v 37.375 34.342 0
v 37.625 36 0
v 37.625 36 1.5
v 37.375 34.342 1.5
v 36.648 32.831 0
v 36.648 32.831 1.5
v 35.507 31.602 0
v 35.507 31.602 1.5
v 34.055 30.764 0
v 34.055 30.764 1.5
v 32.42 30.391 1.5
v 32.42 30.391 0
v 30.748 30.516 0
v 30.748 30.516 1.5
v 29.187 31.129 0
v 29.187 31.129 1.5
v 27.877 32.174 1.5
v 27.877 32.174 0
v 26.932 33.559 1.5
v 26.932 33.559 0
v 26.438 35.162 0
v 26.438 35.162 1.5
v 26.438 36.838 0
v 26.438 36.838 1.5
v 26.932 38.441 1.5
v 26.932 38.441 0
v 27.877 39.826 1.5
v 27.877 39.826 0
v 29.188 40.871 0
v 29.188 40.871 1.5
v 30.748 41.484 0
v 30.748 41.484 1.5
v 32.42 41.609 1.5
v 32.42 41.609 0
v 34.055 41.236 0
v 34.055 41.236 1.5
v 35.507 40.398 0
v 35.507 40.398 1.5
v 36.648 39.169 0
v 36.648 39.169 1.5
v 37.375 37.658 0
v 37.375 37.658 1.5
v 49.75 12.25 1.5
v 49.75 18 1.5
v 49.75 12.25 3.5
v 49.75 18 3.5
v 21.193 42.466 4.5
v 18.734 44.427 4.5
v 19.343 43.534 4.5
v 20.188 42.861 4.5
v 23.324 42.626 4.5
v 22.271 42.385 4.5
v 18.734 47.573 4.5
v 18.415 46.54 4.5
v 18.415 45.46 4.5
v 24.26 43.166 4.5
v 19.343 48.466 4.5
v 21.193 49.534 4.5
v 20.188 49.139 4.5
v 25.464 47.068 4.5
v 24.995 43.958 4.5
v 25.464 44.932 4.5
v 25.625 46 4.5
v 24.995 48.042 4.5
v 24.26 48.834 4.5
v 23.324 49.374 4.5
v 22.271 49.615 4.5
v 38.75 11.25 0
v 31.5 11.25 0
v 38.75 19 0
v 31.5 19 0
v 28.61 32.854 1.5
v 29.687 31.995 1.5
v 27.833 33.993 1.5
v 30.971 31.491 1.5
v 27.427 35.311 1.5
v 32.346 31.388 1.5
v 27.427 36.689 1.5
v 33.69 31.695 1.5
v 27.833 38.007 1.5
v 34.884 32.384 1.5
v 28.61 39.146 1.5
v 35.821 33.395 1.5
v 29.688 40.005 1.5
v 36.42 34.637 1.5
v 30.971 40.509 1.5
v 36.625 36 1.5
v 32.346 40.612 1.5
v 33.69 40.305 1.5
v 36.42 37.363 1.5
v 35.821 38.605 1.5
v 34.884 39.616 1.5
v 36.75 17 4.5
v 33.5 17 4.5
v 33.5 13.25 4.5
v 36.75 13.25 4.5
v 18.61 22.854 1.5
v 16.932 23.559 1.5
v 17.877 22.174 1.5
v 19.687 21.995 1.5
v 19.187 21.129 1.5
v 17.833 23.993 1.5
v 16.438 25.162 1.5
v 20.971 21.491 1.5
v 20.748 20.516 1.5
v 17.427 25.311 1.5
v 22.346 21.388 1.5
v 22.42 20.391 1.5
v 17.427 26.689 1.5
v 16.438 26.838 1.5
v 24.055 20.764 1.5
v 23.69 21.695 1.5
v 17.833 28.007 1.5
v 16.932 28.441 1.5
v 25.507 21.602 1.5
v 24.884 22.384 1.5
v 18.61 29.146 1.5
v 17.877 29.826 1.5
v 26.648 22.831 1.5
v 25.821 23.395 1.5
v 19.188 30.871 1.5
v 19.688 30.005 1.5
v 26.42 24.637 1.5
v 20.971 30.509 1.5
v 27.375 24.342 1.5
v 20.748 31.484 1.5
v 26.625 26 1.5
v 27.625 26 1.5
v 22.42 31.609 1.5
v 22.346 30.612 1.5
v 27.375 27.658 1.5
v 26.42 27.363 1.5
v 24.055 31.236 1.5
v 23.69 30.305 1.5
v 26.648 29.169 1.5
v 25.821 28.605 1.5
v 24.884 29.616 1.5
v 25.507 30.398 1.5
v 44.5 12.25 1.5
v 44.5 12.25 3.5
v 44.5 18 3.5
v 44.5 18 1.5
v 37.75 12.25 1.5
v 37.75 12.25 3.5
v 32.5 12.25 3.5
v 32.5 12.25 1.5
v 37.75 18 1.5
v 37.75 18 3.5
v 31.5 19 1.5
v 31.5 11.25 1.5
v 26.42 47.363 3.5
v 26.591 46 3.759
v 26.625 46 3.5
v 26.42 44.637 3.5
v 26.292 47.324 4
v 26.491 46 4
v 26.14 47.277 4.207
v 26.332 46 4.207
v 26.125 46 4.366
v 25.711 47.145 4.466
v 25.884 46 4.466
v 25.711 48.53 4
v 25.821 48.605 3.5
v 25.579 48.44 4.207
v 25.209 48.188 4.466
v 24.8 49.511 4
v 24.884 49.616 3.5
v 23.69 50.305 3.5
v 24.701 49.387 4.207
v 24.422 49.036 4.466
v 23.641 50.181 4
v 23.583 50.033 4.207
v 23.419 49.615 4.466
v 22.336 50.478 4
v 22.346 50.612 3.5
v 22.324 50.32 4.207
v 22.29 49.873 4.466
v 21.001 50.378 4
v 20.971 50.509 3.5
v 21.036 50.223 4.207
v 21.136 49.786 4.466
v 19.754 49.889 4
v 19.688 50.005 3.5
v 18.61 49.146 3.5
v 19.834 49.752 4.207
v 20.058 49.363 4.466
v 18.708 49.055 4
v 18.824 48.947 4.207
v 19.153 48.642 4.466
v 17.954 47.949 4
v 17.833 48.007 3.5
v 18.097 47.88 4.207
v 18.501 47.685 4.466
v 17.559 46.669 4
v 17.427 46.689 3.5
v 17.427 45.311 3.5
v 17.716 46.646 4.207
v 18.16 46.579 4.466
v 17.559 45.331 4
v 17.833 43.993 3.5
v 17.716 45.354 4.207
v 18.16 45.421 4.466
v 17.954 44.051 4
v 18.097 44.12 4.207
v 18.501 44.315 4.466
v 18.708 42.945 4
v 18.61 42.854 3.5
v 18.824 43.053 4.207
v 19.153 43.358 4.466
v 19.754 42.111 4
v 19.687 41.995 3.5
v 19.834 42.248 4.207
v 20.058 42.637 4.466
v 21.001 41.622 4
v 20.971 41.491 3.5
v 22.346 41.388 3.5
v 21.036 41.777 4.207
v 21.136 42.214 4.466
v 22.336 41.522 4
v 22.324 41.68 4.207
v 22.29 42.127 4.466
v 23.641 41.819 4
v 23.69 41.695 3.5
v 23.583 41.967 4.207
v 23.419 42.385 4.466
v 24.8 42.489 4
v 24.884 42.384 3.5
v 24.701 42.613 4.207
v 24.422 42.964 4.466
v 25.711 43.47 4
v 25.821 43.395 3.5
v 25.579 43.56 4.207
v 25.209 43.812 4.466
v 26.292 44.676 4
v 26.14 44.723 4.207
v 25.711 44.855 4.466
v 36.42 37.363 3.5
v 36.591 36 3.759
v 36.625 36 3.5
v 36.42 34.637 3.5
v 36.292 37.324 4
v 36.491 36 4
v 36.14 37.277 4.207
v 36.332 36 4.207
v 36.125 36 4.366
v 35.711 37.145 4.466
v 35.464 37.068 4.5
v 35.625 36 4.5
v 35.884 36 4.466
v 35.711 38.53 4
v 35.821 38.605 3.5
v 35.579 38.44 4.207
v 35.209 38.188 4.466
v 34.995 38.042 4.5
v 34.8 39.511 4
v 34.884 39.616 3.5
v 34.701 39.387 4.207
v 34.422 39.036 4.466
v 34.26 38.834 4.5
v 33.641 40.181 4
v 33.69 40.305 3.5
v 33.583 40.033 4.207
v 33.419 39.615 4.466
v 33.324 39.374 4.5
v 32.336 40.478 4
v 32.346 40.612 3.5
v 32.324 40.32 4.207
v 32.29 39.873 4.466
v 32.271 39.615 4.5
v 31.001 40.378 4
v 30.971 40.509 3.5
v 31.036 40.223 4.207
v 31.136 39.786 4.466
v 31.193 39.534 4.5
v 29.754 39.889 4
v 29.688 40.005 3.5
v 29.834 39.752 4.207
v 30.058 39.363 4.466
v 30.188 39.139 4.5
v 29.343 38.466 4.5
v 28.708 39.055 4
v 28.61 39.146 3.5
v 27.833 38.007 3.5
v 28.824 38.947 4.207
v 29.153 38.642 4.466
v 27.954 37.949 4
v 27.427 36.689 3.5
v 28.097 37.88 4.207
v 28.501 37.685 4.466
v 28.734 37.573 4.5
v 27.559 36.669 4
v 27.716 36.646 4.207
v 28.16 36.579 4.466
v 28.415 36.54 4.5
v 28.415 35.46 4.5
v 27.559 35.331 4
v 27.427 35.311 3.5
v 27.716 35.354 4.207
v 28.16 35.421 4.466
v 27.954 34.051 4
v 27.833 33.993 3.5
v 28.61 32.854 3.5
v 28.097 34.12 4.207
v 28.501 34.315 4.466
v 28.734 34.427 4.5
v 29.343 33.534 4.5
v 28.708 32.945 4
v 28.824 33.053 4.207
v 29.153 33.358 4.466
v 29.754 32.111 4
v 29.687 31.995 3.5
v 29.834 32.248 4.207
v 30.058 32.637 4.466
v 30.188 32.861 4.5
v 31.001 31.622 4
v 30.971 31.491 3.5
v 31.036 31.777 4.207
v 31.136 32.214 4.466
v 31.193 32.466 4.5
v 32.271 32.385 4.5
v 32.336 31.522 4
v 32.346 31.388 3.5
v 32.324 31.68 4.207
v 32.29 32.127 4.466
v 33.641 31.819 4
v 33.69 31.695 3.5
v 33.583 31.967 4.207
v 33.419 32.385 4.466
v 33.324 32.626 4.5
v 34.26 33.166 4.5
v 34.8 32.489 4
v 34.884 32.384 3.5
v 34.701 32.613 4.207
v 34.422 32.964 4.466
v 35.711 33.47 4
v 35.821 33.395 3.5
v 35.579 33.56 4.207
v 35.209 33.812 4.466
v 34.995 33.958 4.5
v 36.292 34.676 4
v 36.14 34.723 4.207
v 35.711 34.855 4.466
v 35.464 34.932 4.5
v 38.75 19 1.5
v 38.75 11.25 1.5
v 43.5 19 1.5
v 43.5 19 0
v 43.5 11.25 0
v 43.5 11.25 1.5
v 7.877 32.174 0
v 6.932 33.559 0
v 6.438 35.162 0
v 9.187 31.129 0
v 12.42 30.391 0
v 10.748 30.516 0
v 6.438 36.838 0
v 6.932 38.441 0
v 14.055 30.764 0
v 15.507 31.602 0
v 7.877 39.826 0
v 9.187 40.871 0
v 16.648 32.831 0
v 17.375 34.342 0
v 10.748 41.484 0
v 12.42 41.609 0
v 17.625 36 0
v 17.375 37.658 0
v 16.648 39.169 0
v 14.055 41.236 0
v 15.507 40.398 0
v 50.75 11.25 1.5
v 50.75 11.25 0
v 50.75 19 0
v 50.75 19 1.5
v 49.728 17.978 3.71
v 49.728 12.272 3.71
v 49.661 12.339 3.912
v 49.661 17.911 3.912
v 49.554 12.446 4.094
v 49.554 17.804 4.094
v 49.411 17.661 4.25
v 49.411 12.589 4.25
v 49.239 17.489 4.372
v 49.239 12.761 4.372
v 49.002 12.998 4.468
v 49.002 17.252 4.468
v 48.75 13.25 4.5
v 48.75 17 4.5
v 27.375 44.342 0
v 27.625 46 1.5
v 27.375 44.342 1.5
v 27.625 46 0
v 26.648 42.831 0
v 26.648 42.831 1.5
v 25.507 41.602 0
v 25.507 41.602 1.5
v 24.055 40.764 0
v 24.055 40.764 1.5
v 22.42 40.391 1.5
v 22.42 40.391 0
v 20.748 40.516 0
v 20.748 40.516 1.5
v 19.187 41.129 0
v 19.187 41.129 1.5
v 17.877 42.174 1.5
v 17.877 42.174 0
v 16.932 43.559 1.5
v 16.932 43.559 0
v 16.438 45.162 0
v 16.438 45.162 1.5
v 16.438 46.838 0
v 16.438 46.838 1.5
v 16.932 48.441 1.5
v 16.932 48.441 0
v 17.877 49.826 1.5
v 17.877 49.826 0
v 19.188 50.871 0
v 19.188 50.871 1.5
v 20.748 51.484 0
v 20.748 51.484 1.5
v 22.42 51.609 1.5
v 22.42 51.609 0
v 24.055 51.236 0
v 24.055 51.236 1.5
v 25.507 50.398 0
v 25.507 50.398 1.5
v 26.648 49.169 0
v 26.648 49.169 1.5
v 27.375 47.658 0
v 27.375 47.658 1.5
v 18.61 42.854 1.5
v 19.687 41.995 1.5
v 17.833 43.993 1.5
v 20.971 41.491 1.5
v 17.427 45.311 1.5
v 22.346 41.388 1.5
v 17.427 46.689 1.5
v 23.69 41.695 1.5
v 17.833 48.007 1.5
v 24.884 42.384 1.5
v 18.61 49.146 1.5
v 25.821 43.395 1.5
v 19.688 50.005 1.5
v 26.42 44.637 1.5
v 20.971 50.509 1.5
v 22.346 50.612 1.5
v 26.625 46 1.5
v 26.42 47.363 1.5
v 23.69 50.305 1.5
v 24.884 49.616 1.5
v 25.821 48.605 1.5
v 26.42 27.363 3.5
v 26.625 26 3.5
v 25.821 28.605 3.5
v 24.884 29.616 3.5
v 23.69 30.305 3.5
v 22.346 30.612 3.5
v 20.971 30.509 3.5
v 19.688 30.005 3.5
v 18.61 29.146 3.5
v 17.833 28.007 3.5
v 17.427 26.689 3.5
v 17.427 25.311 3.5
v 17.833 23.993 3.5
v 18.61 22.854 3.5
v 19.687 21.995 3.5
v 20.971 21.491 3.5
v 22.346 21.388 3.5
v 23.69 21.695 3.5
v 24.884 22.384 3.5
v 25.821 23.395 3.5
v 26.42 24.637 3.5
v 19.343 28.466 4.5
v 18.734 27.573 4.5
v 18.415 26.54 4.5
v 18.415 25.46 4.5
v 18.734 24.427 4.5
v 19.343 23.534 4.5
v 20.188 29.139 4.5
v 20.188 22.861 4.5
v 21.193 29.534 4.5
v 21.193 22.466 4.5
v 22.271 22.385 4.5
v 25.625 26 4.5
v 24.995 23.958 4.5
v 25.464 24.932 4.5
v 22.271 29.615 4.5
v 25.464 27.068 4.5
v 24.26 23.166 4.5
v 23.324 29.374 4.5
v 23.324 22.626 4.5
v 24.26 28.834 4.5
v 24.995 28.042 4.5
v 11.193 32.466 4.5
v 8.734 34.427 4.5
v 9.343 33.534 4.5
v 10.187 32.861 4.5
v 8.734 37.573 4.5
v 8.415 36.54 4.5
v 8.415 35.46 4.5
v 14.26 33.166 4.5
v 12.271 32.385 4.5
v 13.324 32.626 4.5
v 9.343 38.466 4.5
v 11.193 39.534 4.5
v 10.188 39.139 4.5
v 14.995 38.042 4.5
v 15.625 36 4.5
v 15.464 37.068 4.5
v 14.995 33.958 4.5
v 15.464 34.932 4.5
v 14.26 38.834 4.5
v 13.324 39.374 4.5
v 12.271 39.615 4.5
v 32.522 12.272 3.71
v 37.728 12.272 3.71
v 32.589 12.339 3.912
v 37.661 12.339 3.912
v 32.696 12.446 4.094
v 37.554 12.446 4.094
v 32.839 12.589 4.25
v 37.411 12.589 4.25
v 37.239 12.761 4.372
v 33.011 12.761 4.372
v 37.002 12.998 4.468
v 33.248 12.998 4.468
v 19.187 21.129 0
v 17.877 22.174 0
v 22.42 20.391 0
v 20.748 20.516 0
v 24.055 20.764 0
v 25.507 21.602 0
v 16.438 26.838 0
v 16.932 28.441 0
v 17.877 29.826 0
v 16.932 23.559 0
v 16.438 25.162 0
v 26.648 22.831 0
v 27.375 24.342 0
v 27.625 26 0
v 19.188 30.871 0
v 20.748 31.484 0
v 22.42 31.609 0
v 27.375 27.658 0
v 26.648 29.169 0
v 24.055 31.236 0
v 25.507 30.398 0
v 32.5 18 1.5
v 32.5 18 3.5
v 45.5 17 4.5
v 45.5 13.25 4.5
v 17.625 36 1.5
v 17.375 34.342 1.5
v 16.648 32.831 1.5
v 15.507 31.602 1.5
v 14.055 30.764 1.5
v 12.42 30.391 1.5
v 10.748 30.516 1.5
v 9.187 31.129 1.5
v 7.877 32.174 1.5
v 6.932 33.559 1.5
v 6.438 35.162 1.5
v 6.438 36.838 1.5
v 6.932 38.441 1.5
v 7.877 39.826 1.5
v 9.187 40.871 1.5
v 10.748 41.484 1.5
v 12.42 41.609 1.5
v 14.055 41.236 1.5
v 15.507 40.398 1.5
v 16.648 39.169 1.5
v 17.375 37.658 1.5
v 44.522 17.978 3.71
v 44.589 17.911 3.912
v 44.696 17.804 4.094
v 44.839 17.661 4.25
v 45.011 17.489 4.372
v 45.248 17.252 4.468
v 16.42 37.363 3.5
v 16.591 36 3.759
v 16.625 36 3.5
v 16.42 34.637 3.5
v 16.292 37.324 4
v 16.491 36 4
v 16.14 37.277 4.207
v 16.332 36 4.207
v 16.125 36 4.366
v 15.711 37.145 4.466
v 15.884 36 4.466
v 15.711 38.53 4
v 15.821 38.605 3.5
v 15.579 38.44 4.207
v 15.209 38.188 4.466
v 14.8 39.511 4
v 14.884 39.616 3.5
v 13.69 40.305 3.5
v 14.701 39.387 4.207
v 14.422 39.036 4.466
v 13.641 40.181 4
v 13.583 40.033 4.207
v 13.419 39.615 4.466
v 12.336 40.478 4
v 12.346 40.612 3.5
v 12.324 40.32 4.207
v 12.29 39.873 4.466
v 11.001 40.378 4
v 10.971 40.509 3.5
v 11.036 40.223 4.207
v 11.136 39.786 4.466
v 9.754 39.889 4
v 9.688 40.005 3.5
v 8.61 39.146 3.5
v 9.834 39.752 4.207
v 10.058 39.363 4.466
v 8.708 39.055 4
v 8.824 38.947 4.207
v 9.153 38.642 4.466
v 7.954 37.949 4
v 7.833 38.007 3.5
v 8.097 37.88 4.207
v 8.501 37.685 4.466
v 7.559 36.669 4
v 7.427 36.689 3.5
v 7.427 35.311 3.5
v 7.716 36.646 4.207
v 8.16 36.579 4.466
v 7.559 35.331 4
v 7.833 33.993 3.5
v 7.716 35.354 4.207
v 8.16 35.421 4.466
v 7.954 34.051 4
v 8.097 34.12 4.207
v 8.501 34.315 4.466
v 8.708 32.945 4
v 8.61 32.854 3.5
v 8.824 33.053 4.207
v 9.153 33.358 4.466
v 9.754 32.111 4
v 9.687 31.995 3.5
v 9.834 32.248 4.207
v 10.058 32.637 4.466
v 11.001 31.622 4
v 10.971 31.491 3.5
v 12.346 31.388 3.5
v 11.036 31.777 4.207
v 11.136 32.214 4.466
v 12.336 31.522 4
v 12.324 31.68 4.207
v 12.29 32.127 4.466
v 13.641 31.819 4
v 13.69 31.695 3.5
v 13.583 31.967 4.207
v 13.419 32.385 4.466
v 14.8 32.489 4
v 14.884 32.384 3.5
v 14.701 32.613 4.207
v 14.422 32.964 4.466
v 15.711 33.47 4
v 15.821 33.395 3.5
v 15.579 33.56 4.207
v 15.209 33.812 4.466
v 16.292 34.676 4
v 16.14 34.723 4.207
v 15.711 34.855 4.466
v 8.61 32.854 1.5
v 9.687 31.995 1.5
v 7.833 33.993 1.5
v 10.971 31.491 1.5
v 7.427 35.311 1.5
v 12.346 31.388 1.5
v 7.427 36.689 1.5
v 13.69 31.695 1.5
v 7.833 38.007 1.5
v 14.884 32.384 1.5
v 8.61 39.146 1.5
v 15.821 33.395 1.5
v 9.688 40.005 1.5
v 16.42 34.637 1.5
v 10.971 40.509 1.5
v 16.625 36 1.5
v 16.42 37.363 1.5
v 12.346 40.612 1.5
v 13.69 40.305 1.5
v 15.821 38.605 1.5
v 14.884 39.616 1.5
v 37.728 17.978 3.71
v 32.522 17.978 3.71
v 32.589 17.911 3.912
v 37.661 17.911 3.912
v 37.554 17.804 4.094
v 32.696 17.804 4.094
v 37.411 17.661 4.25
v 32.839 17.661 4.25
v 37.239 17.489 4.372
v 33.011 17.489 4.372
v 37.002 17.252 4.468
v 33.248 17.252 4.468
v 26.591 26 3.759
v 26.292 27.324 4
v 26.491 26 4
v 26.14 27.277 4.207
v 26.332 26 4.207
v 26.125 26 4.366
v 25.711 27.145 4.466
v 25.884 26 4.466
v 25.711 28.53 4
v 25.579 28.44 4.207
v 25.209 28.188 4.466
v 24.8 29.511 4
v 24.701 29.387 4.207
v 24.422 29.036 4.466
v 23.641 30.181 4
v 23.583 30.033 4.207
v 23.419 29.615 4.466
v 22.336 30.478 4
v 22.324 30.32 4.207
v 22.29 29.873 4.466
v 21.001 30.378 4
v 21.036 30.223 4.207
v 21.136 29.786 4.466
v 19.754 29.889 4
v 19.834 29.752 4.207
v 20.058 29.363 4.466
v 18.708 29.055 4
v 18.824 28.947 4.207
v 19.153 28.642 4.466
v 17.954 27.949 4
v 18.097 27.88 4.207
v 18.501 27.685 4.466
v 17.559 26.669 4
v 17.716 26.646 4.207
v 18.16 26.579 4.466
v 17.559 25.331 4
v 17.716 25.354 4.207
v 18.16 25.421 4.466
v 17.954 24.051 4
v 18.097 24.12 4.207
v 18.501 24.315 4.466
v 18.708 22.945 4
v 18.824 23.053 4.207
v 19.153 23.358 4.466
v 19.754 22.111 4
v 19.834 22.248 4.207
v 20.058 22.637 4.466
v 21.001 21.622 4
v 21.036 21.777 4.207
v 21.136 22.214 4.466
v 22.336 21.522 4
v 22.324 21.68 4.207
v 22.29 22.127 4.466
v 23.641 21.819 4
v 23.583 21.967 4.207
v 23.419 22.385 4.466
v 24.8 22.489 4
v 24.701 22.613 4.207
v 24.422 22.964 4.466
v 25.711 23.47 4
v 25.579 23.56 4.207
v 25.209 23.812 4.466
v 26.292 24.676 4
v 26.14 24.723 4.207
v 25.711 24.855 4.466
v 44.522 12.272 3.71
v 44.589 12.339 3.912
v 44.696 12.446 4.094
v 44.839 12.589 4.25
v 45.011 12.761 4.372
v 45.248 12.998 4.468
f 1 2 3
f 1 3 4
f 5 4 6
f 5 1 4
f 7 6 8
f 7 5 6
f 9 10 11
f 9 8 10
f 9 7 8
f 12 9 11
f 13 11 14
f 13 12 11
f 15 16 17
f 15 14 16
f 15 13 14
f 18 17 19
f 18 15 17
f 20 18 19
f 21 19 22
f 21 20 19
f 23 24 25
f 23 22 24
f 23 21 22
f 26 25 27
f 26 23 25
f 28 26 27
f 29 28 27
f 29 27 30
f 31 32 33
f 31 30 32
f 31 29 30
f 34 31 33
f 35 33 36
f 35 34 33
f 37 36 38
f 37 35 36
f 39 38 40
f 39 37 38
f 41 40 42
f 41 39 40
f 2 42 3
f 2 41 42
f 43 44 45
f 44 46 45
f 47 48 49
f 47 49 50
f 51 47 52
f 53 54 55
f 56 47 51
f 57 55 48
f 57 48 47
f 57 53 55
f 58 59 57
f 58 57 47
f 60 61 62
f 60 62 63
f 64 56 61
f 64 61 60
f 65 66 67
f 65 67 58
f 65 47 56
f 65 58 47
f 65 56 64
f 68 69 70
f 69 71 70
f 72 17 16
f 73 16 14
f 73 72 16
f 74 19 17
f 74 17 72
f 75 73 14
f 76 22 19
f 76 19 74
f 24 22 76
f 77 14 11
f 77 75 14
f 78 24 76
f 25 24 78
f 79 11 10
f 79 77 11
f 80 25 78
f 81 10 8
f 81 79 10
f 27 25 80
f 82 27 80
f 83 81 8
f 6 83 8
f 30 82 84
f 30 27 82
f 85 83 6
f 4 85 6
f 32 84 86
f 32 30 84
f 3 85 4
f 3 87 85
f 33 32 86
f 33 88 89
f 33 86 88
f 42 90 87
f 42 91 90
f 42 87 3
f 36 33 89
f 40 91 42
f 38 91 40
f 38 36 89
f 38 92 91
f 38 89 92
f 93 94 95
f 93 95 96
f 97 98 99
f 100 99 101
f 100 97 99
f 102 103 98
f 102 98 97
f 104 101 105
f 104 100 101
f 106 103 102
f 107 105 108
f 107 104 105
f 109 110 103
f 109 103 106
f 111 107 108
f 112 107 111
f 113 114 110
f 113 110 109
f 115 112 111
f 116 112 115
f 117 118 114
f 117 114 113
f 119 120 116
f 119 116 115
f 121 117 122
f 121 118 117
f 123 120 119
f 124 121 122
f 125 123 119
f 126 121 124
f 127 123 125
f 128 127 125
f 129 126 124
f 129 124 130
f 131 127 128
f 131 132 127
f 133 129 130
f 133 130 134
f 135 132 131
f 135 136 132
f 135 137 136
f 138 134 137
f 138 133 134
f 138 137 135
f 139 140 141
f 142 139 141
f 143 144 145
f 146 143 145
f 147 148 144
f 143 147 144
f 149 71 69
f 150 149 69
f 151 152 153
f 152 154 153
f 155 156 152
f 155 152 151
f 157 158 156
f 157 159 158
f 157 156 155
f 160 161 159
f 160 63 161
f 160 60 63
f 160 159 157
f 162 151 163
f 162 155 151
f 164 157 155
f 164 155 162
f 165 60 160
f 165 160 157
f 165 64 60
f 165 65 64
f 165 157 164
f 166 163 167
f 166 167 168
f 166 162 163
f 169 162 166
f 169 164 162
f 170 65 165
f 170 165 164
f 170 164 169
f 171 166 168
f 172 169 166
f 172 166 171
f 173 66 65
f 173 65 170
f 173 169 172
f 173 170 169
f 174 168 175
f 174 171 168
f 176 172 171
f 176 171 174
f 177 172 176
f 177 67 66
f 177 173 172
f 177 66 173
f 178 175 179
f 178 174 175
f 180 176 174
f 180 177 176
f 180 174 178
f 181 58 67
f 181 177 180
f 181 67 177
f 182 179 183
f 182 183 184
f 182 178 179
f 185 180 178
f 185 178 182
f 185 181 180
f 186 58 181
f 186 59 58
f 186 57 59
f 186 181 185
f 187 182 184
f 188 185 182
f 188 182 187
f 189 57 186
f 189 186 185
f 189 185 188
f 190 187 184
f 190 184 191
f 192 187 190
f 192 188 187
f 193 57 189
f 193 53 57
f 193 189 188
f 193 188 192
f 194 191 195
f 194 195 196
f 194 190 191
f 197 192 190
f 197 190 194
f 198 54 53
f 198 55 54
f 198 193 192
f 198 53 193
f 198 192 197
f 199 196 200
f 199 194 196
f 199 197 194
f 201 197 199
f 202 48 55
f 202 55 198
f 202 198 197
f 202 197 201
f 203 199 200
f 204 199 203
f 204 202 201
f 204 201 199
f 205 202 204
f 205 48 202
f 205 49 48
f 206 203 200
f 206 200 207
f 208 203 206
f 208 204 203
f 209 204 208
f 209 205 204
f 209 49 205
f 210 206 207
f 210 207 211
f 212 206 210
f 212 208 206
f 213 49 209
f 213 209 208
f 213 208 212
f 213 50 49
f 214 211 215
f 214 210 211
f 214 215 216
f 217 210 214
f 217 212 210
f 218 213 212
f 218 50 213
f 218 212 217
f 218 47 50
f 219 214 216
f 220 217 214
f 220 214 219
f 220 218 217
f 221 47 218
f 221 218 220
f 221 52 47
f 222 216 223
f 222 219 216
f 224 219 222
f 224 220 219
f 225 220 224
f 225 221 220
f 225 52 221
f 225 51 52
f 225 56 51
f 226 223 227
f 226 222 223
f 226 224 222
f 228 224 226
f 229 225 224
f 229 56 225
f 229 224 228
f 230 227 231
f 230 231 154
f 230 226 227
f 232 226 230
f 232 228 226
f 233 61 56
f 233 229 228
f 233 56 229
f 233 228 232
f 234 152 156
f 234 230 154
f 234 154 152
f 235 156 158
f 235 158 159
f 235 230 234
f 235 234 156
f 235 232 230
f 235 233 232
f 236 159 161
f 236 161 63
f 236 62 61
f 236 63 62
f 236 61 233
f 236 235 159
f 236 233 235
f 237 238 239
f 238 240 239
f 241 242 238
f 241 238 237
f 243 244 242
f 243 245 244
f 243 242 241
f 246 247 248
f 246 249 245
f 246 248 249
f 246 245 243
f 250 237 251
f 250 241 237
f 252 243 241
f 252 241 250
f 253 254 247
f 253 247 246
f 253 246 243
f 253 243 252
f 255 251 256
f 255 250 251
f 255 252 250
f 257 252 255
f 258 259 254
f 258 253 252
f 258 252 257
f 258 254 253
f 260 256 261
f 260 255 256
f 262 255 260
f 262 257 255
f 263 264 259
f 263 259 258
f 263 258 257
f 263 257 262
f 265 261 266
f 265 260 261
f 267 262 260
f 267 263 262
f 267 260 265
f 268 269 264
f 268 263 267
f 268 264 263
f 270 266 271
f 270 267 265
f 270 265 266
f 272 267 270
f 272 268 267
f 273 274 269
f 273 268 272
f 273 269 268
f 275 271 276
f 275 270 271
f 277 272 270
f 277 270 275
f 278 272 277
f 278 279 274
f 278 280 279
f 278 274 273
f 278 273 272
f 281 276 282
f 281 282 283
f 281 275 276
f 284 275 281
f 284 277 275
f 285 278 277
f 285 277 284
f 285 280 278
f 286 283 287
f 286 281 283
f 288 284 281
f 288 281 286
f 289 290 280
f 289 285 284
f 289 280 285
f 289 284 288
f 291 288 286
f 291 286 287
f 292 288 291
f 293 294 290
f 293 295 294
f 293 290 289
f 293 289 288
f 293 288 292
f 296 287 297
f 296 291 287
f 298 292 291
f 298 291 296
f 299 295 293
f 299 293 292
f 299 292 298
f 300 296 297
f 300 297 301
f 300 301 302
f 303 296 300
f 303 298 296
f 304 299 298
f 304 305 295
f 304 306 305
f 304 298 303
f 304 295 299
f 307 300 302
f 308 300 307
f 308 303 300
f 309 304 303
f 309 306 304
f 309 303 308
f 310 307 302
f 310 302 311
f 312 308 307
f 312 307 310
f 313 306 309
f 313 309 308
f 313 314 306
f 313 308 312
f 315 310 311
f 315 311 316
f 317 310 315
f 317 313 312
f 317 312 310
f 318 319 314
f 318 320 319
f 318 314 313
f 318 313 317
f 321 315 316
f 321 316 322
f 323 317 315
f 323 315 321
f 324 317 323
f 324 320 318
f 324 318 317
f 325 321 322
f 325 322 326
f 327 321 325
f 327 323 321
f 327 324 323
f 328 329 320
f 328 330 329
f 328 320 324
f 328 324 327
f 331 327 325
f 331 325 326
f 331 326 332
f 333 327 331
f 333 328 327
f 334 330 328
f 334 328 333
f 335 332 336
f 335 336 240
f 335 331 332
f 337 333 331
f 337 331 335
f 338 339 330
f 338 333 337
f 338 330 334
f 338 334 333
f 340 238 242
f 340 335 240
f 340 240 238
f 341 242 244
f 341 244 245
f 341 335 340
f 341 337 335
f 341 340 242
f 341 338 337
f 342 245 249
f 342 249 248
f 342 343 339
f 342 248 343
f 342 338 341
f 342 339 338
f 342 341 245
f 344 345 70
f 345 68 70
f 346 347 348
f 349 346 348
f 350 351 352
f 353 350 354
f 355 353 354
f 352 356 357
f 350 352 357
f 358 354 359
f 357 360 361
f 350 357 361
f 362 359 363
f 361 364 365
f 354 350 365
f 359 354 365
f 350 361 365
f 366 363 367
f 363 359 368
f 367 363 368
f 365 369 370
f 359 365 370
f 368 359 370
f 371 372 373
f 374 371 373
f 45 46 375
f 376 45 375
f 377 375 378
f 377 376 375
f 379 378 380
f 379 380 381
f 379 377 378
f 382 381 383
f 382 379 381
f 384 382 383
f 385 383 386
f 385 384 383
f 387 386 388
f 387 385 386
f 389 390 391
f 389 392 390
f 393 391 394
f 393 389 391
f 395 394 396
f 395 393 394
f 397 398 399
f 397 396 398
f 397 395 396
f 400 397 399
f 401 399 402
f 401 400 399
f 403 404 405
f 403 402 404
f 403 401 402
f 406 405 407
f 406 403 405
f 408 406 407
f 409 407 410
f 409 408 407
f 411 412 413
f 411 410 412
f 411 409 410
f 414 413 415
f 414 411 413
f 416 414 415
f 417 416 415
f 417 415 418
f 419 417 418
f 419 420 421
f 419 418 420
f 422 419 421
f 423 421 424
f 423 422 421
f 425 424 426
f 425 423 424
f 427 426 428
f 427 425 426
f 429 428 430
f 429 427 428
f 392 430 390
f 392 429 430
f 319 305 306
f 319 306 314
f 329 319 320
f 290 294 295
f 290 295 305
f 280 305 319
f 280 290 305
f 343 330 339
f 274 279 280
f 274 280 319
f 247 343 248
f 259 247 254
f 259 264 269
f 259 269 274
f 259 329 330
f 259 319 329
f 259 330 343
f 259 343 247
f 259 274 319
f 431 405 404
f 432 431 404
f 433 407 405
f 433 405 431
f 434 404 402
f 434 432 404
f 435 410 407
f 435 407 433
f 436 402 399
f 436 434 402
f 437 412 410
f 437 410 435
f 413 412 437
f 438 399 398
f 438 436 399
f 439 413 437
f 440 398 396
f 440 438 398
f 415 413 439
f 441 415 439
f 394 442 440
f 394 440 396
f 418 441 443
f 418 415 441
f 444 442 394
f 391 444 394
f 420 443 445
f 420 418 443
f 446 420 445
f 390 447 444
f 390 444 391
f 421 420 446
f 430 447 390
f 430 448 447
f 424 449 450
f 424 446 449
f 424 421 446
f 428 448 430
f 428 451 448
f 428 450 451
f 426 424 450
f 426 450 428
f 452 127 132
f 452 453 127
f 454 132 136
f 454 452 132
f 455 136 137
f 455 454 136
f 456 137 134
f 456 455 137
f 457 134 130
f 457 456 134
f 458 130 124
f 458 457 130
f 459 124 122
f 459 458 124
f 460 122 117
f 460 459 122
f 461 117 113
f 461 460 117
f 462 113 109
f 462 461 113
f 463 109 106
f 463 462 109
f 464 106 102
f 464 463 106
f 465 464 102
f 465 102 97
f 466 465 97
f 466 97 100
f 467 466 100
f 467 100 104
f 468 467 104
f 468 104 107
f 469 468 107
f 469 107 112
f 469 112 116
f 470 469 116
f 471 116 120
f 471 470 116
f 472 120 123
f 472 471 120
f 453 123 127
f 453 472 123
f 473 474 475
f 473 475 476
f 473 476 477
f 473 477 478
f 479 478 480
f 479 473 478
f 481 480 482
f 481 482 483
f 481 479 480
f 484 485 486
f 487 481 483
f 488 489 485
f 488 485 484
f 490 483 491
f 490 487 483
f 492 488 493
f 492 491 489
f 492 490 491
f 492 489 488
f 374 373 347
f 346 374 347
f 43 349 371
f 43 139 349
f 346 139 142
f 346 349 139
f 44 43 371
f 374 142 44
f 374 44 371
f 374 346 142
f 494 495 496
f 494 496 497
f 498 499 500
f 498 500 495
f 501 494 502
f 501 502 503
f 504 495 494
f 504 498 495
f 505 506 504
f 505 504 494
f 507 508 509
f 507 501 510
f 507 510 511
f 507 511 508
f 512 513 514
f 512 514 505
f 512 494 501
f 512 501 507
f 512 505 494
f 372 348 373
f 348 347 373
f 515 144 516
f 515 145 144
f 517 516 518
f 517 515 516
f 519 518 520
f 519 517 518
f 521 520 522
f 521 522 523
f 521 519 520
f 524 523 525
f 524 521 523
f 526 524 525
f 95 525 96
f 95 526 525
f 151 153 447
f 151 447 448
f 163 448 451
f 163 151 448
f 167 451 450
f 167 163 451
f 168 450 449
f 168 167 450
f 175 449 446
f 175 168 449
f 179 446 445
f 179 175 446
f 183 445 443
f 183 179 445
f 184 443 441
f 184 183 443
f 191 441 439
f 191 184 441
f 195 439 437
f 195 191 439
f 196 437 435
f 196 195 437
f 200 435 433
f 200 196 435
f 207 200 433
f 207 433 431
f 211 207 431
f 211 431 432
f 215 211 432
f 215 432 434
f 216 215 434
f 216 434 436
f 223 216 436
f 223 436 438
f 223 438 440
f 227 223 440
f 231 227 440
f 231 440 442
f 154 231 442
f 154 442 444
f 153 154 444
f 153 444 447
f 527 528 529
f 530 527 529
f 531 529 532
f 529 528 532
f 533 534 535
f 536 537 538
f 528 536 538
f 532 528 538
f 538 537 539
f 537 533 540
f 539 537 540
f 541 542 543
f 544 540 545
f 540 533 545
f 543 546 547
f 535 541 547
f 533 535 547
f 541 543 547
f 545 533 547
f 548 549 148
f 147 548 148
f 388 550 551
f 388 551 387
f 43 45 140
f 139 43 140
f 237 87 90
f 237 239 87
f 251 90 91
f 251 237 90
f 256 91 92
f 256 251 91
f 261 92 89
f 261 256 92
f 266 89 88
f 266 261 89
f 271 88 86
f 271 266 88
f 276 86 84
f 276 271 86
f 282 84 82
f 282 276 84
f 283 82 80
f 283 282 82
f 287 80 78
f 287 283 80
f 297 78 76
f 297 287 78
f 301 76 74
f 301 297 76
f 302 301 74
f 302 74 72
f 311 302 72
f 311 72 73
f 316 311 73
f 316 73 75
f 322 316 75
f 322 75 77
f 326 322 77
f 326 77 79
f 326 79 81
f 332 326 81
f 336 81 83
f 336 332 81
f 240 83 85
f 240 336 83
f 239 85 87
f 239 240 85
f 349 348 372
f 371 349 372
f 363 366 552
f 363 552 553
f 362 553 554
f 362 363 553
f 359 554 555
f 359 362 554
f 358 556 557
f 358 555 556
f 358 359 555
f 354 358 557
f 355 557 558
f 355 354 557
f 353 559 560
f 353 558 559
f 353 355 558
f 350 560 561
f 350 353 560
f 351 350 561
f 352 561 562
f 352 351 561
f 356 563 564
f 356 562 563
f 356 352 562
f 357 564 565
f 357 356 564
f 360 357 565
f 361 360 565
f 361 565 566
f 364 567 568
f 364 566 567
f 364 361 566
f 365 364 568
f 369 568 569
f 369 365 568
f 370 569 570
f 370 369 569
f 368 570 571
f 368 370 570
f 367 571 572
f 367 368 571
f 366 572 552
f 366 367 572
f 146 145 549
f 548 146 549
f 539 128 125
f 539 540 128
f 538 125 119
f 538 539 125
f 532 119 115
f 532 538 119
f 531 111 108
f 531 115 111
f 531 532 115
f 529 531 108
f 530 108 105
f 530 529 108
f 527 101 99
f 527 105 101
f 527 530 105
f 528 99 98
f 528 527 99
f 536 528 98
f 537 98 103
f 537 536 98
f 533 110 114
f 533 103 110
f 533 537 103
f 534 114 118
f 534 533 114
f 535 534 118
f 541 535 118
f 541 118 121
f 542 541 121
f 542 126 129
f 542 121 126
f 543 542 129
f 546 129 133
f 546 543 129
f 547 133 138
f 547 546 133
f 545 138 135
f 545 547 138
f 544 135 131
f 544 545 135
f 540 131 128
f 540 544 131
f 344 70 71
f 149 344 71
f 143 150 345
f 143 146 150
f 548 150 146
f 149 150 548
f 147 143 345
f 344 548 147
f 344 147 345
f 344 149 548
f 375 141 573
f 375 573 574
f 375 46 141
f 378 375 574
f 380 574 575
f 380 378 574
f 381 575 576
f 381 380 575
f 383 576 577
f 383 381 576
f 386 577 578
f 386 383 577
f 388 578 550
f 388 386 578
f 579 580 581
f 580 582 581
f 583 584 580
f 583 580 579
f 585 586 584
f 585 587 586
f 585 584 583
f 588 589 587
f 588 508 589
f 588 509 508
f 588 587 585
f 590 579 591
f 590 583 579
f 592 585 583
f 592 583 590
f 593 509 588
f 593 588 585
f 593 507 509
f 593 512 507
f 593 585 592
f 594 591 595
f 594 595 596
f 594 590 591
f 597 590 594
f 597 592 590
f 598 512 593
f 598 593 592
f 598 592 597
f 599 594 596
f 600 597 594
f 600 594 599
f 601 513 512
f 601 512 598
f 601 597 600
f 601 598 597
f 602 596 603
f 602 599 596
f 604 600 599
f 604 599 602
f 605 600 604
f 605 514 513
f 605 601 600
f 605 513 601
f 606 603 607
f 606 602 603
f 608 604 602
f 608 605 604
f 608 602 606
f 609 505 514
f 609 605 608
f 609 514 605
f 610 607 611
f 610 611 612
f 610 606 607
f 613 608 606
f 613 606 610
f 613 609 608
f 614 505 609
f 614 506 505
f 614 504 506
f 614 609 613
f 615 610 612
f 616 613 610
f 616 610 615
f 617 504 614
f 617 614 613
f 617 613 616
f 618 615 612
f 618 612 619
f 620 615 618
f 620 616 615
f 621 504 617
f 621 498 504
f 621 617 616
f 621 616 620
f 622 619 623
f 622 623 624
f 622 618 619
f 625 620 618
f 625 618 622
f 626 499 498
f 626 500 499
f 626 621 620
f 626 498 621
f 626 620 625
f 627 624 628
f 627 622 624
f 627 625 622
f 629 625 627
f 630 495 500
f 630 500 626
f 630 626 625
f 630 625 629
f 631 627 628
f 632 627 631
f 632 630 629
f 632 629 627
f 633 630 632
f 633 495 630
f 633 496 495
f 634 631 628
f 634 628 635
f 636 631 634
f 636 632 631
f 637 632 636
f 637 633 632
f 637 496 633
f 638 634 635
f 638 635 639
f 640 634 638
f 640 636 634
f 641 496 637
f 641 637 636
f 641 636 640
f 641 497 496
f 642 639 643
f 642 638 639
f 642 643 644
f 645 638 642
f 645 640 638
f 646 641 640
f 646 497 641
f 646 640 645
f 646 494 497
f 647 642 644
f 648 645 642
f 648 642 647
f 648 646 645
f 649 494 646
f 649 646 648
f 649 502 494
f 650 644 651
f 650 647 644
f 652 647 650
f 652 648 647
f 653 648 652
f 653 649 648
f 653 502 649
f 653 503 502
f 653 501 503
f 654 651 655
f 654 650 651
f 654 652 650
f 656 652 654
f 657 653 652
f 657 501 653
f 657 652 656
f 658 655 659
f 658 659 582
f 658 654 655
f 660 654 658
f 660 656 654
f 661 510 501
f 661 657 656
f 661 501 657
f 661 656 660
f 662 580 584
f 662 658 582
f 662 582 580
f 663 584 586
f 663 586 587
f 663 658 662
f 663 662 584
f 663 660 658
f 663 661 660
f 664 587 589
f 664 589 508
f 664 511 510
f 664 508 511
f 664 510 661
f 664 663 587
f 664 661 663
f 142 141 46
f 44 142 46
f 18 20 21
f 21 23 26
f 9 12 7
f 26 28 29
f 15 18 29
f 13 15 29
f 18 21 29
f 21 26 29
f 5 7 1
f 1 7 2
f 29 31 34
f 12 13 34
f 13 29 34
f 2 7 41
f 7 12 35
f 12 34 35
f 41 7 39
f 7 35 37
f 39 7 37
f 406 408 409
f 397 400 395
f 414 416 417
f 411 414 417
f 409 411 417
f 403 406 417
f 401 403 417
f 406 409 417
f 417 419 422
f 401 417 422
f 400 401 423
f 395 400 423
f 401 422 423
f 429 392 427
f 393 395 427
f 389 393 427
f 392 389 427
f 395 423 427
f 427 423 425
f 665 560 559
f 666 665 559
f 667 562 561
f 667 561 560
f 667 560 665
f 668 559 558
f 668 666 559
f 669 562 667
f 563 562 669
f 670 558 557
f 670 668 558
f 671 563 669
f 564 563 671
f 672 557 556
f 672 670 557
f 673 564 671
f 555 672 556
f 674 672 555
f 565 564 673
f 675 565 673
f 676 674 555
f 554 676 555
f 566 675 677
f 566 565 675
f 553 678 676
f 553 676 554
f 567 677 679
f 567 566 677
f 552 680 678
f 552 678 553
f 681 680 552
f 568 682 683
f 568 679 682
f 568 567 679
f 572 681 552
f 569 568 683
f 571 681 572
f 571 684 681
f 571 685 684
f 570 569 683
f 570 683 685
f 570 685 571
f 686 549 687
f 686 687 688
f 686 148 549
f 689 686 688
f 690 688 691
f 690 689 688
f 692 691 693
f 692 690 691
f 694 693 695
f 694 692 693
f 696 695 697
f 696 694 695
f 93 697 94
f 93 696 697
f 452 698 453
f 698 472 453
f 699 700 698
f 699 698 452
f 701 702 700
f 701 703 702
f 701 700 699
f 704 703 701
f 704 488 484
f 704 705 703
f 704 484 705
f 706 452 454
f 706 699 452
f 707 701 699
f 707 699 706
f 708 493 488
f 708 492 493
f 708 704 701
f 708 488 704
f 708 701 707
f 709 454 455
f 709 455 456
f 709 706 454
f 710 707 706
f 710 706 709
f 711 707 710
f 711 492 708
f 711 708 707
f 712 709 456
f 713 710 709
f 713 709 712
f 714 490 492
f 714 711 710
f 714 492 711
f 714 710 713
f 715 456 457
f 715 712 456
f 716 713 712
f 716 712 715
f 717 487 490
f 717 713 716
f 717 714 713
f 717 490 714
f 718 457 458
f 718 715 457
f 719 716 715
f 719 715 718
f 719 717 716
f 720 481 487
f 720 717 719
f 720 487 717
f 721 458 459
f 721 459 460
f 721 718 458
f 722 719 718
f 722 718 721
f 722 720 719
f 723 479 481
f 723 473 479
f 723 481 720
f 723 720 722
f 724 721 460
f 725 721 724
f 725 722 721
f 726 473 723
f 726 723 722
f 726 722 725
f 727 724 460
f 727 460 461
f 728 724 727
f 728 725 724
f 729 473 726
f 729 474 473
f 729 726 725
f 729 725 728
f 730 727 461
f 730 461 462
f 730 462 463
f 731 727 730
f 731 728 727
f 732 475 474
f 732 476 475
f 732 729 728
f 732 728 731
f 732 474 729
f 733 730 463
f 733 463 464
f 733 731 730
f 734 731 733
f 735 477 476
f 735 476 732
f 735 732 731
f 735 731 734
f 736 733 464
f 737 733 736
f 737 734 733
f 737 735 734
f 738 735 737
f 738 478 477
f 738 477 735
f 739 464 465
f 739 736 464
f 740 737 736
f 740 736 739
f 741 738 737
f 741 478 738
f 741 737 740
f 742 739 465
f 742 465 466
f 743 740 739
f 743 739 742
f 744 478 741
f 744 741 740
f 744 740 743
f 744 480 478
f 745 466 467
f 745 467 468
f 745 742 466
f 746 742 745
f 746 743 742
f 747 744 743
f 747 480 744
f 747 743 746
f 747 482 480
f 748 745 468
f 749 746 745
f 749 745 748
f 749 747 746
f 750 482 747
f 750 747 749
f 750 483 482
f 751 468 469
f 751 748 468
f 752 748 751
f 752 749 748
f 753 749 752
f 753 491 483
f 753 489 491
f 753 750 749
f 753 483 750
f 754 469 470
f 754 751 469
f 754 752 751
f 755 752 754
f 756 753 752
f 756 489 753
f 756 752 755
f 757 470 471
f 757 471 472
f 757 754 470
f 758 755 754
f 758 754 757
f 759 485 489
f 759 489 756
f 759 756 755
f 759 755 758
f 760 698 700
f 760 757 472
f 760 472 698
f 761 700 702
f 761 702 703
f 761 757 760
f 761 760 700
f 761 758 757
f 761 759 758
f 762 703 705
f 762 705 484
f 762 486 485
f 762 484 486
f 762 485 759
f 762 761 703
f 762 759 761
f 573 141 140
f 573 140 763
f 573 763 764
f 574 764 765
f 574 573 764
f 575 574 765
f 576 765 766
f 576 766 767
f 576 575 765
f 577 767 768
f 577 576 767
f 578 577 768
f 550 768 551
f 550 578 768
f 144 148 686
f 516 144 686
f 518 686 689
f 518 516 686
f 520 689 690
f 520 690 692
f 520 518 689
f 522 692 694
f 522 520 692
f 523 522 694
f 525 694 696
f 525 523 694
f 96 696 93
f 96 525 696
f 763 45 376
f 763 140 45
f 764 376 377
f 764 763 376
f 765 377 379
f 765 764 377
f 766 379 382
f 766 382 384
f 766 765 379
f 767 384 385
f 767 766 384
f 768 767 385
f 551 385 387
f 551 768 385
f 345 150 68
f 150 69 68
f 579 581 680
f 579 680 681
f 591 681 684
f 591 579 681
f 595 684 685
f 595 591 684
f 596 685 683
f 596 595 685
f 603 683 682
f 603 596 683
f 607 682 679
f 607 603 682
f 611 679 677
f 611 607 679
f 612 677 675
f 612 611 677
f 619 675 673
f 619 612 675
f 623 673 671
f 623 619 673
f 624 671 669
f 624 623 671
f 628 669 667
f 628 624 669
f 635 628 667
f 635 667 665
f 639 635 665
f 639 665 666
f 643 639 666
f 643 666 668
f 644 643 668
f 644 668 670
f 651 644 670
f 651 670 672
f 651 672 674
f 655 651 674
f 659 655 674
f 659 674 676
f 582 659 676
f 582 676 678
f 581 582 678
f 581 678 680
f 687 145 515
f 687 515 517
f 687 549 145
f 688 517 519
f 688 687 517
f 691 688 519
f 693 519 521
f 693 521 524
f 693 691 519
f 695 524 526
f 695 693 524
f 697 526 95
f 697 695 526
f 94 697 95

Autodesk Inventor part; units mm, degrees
ref_plane "YZ Plane" through (0, 0, 0) normal (1, 0, 0) x (0, 1, 0)
ref_plane "XZ Plane" through (0, 0, 0) normal (0, 1, 0) x (-1, 0, 0)
ref_plane "XY Plane" through (0, 0, 0) normal (0, 0, 1) x (1, 0, 0)
sketch "Sketch1" plane through (0, 0, 0) normal (0, 0, 1) x (1, 0, 0)
  circle A0 centre (22, 46) radius 4.5
  circle A1 centre (12, 36) radius 4.5
  circle A2 centre (22, 26) radius 4.5
  circle A3 centre (32, 36) radius 4.5
  line L0 (37.75, 18) -> (32.5, 18)
  line L1 (32.5, 18) -> (32.5, 12.25)
  line L2 (32.5, 12.25) -> (37.75, 12.25)
  line L3 (37.75, 12.25) -> (37.75, 18)
  line L4 (44.5, 18) -> (49.75, 18)
  line L5 (49.75, 18) -> (49.75, 12.25)
  line L6 (49.75, 12.25) -> (44.5, 12.25)
  line L7 (44.5, 12.25) -> (44.5, 18)
  circle A4 centre (12, 36) radius 5.625
  circle A5 centre (22, 46) radius 5.625
  circle A6 centre (32, 36) radius 5.625
  circle A7 centre (22, 26) radius 5.625
  line L8 (38.75, 19) -> (31.5, 19)
  line L9 (31.5, 19) -> (31.5, 11.25)
  line L10 (31.5, 11.25) -> (38.75, 11.25)
  line L11 (38.75, 11.25) -> (38.75, 19)
  line L12 (50.75, 19) -> (43.5, 19)
  line L13 (43.5, 19) -> (43.5, 11.25)
  line L14 (43.5, 11.25) -> (50.75, 11.25)
  line L15 (50.75, 11.25) -> (50.75, 19)
  point P0 (18.75, 39)
  point P1 (18.75, 32.5)
  dimension "d35" = 11.25
  dimension "d36" = 11.25
  dimension "d37" = 11.25
  dimension "d38" = 11.25
  dimension "d43" = 7.75
  dimension "d44" = 7.75
  dimension "d45" = 7.25
  dimension "d46" = 7.25
  dimension "d47" = 5.75
  dimension "d48" = 5.25
  dimension "d49" = 5.75
  dimension "d50" = 5.25
extrude "Extrusion1" add sketch "Sketch1" along normal blind 4.5 contours A0 | A1 | A2 | A3 | L3 L2 L1 L0 | L4 L5 L6 L7 | A4 | A5 | A6 | A7 | L11 L10 L9 L8 | L15 L14 L13 L12
sketch "Sketch2" plane through (0, 0, 4.5) normal (0, 0, 1) x (1, 0, 0)
  circle A0 centre (22, 46) radius 4.625
  circle A1 centre (12, 36) radius 4.625
  circle A2 centre (22, 26) radius 4.625
  circle A3 centre (32, 36) radius 4.625
  circle A4 centre (22, 46) radius 5.625
  circle A5 centre (12, 36) radius 5.625
  circle A6 centre (22, 26) radius 5.625
  circle A7 centre (32, 36) radius 5.625
  line L0 (31.5, 19) -> (31.5, 11.25) projected
  line L1 (38.75, 11.25) -> (38.75, 19) projected
  line L2 (31.5, 19) -> (38.75, 19)
  line L3 (38.75, 19) -> (38.75, 11.25)
  line L4 (38.75, 11.25) -> (31.5, 11.25)
  line L5 (31.5, 11.25) -> (31.5, 19)
  line L6 (50.75, 19) -> (43.5, 19) projected
  line L7 (43.5, 11.25) -> (50.75, 11.25) projected
  line L8 (43.5, 19) -> (50.75, 19)
  line L9 (50.75, 19) -> (50.75, 11.25)
  line L10 (50.75, 11.25) -> (43.5, 11.25)
  line L11 (43.5, 11.25) -> (43.5, 19)
  line L12 (37.75, 18) -> (32.5, 18)
  line L13 (32.5, 18) -> (32.5, 12.25)
  line L14 (32.5, 12.25) -> (37.75, 12.25)
  line L15 (37.75, 12.25) -> (37.75, 18)
  line L16 (44.5, 18) -> (49.75, 18)
  line L17 (49.75, 18) -> (49.75, 12.25)
  line L18 (49.75, 12.25) -> (44.5, 12.25)
  line L19 (44.5, 12.25) -> (44.5, 18)
  dimension "d16" = 1
  dimension "d17" = 1
  dimension "d18" = 1
  dimension "d19" = 1
  dimension "d39" = 11.25
  dimension "d40" = 11.25
  dimension "d41" = 11.25
  dimension "d42" = 11.25
  dimension "d51" = 1
  dimension "d52" = 1
extrude "Extrusion2" cut sketch "Sketch2" against normal blind 3 contours A4 | A5 | A6 | A7
fillet "Fillet2" radius 1 4 edges at (17.375, 46, 4.5) (27.375, 36, 4.5) (17.375, 26, 4.5) (7.375, 36, 4.5)
sketch "Sketch5" plane through (0, 0, 4.5) normal (0, 0, 1) x (1, 0, 0)
  line L0 (31.5, 19) -> (31.5, 11.25) projected
  line L1 (38.75, 11.25) -> (38.75, 19) projected
  line L2 (31.5, 11.25) -> (38.75, 11.25)
  line L3 (38.75, 11.25) -> (38.75, 19)
  line L4 (38.75, 19) -> (31.5, 19)
  line L5 (31.5, 19) -> (31.5, 11.25)
  line L6 (32.5, 18) -> (37.75, 18)
  line L7 (37.75, 18) -> (37.75, 12.25)
  line L8 (37.75, 12.25) -> (32.5, 12.25)
  line L9 (32.5, 12.25) -> (32.5, 18)
  line L10 (43.5, 11.25) -> (50.75, 11.25) projected
  line L11 (50.75, 11.25) -> (50.75, 19) projected
  line L12 (43.5, 11.25) -> (50.75, 11.25)
  line L13 (50.75, 11.25) -> (50.75, 19)
  line L14 (50.75, 19) -> (43.5, 19)
  line L15 (43.5, 19) -> (43.5, 11.25)
  line L16 (44.5, 18) -> (49.75, 18)
  line L17 (49.75, 18) -> (49.75, 12.25)
  line L18 (49.75, 12.25) -> (44.5, 12.25)
  line L19 (44.5, 12.25) -> (44.5, 18)
  point P0 (0, 0)
  point P1 (43.5, 19)
  dimension "d43" = 7.75
  dimension "d58" = 1
  dimension "d60" = 1
extrude "Extrusion5" cut sketch "Sketch5" against normal blind 3
fillet "Fillet5" radius 1 8 edges at (32.5, 15.125, 4.5) (35.125, 12.25, 4.5) (37.75, 15.125, 4.5) (35.125, 18, 4.5) (44.5, 15.125, 4.5) (47.125, 12.25, 4.5) (49.75, 15.125, 4.5) (47.125, 18, 4.5)
properties part number "Groboy Buttons shorty"
